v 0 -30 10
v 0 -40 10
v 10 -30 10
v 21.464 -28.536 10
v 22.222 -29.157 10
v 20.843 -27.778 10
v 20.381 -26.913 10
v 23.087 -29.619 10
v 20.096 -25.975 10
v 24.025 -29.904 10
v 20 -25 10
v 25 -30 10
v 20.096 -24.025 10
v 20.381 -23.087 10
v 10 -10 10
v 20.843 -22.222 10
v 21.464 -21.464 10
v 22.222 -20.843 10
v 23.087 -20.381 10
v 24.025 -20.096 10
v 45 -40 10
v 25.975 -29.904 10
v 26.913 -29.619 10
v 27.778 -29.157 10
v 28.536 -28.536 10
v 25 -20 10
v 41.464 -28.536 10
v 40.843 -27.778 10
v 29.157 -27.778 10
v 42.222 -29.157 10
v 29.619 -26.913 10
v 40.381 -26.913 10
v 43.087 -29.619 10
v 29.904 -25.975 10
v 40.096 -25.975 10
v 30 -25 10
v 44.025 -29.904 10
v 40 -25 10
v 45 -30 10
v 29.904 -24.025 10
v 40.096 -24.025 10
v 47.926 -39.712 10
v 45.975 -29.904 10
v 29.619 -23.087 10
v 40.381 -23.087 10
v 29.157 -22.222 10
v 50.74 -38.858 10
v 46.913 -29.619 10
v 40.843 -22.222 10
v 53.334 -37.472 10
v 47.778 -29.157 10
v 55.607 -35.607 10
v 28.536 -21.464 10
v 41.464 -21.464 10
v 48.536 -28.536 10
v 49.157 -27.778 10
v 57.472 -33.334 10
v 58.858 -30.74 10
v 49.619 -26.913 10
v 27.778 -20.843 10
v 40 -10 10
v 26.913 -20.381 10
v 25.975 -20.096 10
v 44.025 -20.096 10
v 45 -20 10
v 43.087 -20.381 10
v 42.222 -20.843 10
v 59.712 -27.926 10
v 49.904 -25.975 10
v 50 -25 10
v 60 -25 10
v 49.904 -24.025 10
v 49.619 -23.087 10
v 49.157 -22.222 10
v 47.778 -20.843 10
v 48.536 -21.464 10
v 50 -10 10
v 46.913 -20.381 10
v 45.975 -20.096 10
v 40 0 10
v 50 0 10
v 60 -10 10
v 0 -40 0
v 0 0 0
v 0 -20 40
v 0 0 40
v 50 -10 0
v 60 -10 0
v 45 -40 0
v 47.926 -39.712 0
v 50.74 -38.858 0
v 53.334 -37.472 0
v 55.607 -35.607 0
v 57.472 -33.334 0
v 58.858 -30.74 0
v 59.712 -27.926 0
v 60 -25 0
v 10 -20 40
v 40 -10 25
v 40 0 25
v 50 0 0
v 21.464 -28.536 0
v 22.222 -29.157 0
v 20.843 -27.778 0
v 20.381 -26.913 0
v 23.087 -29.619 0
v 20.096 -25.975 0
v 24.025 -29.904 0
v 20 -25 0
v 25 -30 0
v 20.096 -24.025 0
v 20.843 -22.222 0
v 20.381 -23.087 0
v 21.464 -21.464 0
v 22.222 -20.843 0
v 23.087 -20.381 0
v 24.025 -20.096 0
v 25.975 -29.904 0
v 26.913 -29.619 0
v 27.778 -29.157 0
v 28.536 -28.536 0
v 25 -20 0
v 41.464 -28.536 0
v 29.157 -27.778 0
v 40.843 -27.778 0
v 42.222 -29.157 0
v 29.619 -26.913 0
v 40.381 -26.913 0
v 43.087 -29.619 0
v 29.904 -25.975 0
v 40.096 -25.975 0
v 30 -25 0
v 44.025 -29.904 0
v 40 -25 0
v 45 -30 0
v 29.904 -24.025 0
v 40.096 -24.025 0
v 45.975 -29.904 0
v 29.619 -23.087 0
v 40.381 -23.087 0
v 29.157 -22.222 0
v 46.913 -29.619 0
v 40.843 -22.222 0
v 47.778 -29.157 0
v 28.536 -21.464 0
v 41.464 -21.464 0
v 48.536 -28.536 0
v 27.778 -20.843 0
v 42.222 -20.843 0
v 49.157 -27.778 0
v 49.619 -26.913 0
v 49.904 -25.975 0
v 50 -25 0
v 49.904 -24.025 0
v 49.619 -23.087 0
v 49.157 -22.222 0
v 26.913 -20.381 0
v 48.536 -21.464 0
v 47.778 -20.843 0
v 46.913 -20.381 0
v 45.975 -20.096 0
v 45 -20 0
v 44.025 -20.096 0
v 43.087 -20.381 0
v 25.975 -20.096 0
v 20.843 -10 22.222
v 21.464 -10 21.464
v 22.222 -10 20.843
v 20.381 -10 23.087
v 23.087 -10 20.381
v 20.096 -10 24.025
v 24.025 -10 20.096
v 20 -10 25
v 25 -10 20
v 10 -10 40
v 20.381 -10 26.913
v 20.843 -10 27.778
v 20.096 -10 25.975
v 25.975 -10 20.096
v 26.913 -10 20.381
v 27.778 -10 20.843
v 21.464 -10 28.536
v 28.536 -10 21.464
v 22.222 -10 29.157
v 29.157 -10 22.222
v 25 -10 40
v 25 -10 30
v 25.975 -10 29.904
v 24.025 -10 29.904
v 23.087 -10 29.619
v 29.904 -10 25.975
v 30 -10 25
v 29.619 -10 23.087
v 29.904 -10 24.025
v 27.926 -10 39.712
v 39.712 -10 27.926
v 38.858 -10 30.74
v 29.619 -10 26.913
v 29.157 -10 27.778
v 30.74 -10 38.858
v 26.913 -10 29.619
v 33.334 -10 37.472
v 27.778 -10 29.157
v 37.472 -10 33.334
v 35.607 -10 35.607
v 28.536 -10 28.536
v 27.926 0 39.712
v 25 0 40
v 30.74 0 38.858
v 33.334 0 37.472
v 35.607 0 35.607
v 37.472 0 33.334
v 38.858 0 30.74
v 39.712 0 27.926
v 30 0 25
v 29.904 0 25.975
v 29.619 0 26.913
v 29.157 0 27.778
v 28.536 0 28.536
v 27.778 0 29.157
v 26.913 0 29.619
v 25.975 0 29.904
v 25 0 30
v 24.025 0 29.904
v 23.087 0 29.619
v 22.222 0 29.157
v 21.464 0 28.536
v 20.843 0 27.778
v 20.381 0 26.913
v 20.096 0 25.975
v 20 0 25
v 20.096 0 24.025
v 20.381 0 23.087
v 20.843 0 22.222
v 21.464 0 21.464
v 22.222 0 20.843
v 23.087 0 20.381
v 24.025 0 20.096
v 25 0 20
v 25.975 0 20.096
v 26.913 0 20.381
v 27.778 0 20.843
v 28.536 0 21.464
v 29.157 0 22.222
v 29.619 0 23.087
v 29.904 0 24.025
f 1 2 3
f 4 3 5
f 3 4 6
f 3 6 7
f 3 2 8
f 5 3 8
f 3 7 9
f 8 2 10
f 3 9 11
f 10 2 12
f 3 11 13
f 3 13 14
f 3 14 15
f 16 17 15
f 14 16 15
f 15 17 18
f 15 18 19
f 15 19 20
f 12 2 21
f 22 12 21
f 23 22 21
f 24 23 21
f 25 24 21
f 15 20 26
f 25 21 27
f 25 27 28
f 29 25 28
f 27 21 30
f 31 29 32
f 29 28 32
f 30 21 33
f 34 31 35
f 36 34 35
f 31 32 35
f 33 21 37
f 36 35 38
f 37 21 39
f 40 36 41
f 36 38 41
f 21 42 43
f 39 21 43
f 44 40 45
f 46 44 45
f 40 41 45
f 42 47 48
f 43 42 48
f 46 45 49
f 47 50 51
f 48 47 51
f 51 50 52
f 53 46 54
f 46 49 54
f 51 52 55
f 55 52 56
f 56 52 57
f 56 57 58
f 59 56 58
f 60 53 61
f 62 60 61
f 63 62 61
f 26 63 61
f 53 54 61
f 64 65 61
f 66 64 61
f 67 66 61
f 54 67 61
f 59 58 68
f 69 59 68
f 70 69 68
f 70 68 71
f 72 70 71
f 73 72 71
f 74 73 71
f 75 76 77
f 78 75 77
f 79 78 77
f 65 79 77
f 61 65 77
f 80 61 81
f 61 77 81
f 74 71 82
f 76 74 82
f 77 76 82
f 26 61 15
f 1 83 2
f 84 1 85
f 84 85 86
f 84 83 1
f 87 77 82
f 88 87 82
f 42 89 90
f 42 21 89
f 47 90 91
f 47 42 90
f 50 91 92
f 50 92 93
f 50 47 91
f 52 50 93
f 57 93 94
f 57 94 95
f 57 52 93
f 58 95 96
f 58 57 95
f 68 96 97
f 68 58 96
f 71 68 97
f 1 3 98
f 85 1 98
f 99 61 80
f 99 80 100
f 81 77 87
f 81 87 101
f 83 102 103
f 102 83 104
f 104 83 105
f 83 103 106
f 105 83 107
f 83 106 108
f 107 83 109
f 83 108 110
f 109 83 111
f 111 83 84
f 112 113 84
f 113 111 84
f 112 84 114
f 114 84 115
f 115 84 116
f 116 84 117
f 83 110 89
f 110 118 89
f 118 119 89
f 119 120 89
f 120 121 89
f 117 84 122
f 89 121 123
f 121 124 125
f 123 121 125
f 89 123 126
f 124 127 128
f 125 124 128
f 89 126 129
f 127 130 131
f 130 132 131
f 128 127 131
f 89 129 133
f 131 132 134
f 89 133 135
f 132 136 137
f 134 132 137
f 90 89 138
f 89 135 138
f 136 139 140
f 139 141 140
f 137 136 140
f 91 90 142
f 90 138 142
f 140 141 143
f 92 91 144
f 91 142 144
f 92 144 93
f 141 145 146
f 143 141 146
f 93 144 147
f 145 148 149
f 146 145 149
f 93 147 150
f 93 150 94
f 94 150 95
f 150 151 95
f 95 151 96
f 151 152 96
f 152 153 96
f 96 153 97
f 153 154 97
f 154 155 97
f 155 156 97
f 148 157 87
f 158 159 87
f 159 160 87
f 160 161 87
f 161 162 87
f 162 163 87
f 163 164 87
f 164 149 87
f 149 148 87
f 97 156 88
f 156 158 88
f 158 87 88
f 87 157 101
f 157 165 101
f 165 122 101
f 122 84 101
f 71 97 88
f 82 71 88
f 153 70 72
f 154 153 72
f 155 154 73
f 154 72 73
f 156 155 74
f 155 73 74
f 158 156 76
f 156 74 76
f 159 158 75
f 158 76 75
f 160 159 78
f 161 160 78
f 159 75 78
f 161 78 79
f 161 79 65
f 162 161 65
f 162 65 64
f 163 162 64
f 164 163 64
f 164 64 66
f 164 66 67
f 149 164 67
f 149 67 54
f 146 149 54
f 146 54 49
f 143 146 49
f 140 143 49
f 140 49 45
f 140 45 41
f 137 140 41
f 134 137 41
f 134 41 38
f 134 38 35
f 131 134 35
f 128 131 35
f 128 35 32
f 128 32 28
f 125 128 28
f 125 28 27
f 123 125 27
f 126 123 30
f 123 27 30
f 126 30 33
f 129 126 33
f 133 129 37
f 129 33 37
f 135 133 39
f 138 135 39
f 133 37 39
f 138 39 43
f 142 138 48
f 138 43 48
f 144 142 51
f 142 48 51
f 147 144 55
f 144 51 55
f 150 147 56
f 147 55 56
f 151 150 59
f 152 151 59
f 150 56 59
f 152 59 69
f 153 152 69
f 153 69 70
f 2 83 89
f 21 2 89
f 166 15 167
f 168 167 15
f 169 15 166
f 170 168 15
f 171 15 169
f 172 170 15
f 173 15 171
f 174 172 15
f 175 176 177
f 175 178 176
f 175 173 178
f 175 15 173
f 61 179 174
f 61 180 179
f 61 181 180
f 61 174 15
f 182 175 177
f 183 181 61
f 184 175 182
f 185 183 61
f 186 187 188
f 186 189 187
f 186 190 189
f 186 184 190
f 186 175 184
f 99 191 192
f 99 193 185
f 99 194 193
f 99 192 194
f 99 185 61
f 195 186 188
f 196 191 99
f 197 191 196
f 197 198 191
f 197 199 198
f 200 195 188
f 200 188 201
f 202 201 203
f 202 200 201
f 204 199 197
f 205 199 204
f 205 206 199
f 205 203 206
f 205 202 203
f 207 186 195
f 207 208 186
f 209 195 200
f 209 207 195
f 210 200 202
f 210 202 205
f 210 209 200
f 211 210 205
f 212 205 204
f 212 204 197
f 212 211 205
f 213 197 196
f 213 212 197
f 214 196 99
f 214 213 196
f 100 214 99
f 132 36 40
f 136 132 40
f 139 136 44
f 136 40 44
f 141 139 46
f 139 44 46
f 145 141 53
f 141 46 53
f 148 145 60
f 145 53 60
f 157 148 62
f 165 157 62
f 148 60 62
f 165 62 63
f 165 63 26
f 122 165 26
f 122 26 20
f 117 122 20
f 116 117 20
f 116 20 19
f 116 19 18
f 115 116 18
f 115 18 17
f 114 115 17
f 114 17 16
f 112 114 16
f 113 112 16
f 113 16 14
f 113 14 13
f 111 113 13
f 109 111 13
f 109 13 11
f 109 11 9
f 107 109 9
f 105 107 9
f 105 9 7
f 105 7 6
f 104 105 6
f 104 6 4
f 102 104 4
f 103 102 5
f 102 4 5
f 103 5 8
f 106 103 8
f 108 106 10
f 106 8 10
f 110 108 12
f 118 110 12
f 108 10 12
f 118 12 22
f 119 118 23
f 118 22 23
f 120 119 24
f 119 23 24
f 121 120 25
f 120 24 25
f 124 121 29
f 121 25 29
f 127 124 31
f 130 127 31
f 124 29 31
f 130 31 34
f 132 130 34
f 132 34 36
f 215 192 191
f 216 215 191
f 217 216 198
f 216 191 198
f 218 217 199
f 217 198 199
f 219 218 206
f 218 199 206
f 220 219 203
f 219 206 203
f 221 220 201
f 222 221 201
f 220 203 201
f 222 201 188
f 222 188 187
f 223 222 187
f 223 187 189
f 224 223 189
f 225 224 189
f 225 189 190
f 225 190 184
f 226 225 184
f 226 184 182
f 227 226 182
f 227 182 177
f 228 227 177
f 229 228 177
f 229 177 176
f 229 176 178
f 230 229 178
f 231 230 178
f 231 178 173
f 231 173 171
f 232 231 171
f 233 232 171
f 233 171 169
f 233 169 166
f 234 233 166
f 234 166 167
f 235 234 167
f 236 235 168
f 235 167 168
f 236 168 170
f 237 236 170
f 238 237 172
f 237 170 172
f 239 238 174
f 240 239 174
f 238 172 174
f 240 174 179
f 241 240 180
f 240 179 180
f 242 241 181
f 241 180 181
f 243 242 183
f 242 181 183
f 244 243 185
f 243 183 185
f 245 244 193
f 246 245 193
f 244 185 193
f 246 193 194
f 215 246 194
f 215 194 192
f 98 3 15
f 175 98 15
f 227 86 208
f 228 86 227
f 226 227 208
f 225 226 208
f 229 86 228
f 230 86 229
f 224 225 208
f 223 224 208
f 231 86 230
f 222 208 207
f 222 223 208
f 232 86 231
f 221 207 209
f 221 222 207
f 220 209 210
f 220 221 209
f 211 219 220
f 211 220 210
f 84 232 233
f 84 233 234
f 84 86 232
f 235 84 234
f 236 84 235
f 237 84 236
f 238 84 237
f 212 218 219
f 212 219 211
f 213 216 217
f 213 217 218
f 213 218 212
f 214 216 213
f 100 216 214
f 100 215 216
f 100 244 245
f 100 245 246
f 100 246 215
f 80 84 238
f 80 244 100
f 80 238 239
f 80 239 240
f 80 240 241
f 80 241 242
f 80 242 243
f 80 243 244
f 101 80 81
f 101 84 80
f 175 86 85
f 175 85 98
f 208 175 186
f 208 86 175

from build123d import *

# Parameters (mm, degrees)
F0_W      = 60
F0_H      = 40
F1_DEPTH  = 40
F2_W      = 60
F2_H      = 40
F3_DEPTH  = 30
F5_DEPTH  = 10.001
F6_W      = 25
F6_H      = 35
F7_DEPTH  = 10.001
F8_W      = 15
F8_H      = 15
F9_DEPTH  = 10.001
F10_R     = 5
F11_DEPTH = 10.001
F12_R     = 5
F13_DEPTH = 10.001
F14_R     = 15
F15_R     = 15


with BuildPart() as f1:
    # F0 (on Top) → F1 (new body)
    with BuildSketch(Plane.XY):
        with Locations((30, -20)):
            Rectangle(F0_W, F0_H)
    extrude(amount=F1_DEPTH)

    # F2 (on face) → F3 (cut)
    with BuildSketch(Plane.XY.offset(40)):
        with Locations((40, -30)):
            Rectangle(F2_W, F2_H)
    extrude(amount=-F3_DEPTH, mode=Mode.SUBTRACT)

    # F4 (on face) → F5 (cut, through all)
    with BuildSketch(Plane.YZ.offset(10)):
        Polygon((-30, 10), (-20, 40), (-20, 45), (-45, 45), (-45, 10), align=None)
    extrude(amount=-F5_DEPTH, mode=Mode.SUBTRACT)

    # F6 (on face) → F7 (cut, through all)
    with BuildSketch(Plane.XZ.offset(10)):
        with Locations((52.5, 27.5)):
            Rectangle(F6_W, F6_H)
    extrude(amount=-F7_DEPTH, mode=Mode.SUBTRACT)

    # F8 (on face) → F9 (cut, through all)
    with BuildSketch(Plane.XY.offset(10)):
        with Locations((57.5, -2.5)):
            Rectangle(F8_W, F8_H)
    extrude(amount=-F9_DEPTH, mode=Mode.SUBTRACT)

    # F10 (on face) → F11 (cut, through all)
    with BuildSketch(Plane.XY.offset(10)):
        with Locations((25, -25)):
            Circle(F10_R)
        with Locations((45, -25)):
            Circle(F10_R)
    extrude(amount=-F11_DEPTH, mode=Mode.SUBTRACT)

    # F12 (on face) → F13 (cut, through all)
    with BuildSketch(Plane.XZ.offset(10)):
        with Locations((25, 25)):
            Circle(F12_R)
    extrude(amount=-F13_DEPTH, mode=Mode.SUBTRACT)

    # F14
    f14_edges = [f1.edges().sort_by_distance(p)[0] for p in [
        (60, -40, 5),
    ]]
    fillet(f14_edges, radius=F14_R)

    # F15
    f15_edges = [f1.edges().sort_by_distance(p)[0] for p in [
        (40, -5, 40),
    ]]
    fillet(f15_edges, radius=F15_R)


solid = f1.part
